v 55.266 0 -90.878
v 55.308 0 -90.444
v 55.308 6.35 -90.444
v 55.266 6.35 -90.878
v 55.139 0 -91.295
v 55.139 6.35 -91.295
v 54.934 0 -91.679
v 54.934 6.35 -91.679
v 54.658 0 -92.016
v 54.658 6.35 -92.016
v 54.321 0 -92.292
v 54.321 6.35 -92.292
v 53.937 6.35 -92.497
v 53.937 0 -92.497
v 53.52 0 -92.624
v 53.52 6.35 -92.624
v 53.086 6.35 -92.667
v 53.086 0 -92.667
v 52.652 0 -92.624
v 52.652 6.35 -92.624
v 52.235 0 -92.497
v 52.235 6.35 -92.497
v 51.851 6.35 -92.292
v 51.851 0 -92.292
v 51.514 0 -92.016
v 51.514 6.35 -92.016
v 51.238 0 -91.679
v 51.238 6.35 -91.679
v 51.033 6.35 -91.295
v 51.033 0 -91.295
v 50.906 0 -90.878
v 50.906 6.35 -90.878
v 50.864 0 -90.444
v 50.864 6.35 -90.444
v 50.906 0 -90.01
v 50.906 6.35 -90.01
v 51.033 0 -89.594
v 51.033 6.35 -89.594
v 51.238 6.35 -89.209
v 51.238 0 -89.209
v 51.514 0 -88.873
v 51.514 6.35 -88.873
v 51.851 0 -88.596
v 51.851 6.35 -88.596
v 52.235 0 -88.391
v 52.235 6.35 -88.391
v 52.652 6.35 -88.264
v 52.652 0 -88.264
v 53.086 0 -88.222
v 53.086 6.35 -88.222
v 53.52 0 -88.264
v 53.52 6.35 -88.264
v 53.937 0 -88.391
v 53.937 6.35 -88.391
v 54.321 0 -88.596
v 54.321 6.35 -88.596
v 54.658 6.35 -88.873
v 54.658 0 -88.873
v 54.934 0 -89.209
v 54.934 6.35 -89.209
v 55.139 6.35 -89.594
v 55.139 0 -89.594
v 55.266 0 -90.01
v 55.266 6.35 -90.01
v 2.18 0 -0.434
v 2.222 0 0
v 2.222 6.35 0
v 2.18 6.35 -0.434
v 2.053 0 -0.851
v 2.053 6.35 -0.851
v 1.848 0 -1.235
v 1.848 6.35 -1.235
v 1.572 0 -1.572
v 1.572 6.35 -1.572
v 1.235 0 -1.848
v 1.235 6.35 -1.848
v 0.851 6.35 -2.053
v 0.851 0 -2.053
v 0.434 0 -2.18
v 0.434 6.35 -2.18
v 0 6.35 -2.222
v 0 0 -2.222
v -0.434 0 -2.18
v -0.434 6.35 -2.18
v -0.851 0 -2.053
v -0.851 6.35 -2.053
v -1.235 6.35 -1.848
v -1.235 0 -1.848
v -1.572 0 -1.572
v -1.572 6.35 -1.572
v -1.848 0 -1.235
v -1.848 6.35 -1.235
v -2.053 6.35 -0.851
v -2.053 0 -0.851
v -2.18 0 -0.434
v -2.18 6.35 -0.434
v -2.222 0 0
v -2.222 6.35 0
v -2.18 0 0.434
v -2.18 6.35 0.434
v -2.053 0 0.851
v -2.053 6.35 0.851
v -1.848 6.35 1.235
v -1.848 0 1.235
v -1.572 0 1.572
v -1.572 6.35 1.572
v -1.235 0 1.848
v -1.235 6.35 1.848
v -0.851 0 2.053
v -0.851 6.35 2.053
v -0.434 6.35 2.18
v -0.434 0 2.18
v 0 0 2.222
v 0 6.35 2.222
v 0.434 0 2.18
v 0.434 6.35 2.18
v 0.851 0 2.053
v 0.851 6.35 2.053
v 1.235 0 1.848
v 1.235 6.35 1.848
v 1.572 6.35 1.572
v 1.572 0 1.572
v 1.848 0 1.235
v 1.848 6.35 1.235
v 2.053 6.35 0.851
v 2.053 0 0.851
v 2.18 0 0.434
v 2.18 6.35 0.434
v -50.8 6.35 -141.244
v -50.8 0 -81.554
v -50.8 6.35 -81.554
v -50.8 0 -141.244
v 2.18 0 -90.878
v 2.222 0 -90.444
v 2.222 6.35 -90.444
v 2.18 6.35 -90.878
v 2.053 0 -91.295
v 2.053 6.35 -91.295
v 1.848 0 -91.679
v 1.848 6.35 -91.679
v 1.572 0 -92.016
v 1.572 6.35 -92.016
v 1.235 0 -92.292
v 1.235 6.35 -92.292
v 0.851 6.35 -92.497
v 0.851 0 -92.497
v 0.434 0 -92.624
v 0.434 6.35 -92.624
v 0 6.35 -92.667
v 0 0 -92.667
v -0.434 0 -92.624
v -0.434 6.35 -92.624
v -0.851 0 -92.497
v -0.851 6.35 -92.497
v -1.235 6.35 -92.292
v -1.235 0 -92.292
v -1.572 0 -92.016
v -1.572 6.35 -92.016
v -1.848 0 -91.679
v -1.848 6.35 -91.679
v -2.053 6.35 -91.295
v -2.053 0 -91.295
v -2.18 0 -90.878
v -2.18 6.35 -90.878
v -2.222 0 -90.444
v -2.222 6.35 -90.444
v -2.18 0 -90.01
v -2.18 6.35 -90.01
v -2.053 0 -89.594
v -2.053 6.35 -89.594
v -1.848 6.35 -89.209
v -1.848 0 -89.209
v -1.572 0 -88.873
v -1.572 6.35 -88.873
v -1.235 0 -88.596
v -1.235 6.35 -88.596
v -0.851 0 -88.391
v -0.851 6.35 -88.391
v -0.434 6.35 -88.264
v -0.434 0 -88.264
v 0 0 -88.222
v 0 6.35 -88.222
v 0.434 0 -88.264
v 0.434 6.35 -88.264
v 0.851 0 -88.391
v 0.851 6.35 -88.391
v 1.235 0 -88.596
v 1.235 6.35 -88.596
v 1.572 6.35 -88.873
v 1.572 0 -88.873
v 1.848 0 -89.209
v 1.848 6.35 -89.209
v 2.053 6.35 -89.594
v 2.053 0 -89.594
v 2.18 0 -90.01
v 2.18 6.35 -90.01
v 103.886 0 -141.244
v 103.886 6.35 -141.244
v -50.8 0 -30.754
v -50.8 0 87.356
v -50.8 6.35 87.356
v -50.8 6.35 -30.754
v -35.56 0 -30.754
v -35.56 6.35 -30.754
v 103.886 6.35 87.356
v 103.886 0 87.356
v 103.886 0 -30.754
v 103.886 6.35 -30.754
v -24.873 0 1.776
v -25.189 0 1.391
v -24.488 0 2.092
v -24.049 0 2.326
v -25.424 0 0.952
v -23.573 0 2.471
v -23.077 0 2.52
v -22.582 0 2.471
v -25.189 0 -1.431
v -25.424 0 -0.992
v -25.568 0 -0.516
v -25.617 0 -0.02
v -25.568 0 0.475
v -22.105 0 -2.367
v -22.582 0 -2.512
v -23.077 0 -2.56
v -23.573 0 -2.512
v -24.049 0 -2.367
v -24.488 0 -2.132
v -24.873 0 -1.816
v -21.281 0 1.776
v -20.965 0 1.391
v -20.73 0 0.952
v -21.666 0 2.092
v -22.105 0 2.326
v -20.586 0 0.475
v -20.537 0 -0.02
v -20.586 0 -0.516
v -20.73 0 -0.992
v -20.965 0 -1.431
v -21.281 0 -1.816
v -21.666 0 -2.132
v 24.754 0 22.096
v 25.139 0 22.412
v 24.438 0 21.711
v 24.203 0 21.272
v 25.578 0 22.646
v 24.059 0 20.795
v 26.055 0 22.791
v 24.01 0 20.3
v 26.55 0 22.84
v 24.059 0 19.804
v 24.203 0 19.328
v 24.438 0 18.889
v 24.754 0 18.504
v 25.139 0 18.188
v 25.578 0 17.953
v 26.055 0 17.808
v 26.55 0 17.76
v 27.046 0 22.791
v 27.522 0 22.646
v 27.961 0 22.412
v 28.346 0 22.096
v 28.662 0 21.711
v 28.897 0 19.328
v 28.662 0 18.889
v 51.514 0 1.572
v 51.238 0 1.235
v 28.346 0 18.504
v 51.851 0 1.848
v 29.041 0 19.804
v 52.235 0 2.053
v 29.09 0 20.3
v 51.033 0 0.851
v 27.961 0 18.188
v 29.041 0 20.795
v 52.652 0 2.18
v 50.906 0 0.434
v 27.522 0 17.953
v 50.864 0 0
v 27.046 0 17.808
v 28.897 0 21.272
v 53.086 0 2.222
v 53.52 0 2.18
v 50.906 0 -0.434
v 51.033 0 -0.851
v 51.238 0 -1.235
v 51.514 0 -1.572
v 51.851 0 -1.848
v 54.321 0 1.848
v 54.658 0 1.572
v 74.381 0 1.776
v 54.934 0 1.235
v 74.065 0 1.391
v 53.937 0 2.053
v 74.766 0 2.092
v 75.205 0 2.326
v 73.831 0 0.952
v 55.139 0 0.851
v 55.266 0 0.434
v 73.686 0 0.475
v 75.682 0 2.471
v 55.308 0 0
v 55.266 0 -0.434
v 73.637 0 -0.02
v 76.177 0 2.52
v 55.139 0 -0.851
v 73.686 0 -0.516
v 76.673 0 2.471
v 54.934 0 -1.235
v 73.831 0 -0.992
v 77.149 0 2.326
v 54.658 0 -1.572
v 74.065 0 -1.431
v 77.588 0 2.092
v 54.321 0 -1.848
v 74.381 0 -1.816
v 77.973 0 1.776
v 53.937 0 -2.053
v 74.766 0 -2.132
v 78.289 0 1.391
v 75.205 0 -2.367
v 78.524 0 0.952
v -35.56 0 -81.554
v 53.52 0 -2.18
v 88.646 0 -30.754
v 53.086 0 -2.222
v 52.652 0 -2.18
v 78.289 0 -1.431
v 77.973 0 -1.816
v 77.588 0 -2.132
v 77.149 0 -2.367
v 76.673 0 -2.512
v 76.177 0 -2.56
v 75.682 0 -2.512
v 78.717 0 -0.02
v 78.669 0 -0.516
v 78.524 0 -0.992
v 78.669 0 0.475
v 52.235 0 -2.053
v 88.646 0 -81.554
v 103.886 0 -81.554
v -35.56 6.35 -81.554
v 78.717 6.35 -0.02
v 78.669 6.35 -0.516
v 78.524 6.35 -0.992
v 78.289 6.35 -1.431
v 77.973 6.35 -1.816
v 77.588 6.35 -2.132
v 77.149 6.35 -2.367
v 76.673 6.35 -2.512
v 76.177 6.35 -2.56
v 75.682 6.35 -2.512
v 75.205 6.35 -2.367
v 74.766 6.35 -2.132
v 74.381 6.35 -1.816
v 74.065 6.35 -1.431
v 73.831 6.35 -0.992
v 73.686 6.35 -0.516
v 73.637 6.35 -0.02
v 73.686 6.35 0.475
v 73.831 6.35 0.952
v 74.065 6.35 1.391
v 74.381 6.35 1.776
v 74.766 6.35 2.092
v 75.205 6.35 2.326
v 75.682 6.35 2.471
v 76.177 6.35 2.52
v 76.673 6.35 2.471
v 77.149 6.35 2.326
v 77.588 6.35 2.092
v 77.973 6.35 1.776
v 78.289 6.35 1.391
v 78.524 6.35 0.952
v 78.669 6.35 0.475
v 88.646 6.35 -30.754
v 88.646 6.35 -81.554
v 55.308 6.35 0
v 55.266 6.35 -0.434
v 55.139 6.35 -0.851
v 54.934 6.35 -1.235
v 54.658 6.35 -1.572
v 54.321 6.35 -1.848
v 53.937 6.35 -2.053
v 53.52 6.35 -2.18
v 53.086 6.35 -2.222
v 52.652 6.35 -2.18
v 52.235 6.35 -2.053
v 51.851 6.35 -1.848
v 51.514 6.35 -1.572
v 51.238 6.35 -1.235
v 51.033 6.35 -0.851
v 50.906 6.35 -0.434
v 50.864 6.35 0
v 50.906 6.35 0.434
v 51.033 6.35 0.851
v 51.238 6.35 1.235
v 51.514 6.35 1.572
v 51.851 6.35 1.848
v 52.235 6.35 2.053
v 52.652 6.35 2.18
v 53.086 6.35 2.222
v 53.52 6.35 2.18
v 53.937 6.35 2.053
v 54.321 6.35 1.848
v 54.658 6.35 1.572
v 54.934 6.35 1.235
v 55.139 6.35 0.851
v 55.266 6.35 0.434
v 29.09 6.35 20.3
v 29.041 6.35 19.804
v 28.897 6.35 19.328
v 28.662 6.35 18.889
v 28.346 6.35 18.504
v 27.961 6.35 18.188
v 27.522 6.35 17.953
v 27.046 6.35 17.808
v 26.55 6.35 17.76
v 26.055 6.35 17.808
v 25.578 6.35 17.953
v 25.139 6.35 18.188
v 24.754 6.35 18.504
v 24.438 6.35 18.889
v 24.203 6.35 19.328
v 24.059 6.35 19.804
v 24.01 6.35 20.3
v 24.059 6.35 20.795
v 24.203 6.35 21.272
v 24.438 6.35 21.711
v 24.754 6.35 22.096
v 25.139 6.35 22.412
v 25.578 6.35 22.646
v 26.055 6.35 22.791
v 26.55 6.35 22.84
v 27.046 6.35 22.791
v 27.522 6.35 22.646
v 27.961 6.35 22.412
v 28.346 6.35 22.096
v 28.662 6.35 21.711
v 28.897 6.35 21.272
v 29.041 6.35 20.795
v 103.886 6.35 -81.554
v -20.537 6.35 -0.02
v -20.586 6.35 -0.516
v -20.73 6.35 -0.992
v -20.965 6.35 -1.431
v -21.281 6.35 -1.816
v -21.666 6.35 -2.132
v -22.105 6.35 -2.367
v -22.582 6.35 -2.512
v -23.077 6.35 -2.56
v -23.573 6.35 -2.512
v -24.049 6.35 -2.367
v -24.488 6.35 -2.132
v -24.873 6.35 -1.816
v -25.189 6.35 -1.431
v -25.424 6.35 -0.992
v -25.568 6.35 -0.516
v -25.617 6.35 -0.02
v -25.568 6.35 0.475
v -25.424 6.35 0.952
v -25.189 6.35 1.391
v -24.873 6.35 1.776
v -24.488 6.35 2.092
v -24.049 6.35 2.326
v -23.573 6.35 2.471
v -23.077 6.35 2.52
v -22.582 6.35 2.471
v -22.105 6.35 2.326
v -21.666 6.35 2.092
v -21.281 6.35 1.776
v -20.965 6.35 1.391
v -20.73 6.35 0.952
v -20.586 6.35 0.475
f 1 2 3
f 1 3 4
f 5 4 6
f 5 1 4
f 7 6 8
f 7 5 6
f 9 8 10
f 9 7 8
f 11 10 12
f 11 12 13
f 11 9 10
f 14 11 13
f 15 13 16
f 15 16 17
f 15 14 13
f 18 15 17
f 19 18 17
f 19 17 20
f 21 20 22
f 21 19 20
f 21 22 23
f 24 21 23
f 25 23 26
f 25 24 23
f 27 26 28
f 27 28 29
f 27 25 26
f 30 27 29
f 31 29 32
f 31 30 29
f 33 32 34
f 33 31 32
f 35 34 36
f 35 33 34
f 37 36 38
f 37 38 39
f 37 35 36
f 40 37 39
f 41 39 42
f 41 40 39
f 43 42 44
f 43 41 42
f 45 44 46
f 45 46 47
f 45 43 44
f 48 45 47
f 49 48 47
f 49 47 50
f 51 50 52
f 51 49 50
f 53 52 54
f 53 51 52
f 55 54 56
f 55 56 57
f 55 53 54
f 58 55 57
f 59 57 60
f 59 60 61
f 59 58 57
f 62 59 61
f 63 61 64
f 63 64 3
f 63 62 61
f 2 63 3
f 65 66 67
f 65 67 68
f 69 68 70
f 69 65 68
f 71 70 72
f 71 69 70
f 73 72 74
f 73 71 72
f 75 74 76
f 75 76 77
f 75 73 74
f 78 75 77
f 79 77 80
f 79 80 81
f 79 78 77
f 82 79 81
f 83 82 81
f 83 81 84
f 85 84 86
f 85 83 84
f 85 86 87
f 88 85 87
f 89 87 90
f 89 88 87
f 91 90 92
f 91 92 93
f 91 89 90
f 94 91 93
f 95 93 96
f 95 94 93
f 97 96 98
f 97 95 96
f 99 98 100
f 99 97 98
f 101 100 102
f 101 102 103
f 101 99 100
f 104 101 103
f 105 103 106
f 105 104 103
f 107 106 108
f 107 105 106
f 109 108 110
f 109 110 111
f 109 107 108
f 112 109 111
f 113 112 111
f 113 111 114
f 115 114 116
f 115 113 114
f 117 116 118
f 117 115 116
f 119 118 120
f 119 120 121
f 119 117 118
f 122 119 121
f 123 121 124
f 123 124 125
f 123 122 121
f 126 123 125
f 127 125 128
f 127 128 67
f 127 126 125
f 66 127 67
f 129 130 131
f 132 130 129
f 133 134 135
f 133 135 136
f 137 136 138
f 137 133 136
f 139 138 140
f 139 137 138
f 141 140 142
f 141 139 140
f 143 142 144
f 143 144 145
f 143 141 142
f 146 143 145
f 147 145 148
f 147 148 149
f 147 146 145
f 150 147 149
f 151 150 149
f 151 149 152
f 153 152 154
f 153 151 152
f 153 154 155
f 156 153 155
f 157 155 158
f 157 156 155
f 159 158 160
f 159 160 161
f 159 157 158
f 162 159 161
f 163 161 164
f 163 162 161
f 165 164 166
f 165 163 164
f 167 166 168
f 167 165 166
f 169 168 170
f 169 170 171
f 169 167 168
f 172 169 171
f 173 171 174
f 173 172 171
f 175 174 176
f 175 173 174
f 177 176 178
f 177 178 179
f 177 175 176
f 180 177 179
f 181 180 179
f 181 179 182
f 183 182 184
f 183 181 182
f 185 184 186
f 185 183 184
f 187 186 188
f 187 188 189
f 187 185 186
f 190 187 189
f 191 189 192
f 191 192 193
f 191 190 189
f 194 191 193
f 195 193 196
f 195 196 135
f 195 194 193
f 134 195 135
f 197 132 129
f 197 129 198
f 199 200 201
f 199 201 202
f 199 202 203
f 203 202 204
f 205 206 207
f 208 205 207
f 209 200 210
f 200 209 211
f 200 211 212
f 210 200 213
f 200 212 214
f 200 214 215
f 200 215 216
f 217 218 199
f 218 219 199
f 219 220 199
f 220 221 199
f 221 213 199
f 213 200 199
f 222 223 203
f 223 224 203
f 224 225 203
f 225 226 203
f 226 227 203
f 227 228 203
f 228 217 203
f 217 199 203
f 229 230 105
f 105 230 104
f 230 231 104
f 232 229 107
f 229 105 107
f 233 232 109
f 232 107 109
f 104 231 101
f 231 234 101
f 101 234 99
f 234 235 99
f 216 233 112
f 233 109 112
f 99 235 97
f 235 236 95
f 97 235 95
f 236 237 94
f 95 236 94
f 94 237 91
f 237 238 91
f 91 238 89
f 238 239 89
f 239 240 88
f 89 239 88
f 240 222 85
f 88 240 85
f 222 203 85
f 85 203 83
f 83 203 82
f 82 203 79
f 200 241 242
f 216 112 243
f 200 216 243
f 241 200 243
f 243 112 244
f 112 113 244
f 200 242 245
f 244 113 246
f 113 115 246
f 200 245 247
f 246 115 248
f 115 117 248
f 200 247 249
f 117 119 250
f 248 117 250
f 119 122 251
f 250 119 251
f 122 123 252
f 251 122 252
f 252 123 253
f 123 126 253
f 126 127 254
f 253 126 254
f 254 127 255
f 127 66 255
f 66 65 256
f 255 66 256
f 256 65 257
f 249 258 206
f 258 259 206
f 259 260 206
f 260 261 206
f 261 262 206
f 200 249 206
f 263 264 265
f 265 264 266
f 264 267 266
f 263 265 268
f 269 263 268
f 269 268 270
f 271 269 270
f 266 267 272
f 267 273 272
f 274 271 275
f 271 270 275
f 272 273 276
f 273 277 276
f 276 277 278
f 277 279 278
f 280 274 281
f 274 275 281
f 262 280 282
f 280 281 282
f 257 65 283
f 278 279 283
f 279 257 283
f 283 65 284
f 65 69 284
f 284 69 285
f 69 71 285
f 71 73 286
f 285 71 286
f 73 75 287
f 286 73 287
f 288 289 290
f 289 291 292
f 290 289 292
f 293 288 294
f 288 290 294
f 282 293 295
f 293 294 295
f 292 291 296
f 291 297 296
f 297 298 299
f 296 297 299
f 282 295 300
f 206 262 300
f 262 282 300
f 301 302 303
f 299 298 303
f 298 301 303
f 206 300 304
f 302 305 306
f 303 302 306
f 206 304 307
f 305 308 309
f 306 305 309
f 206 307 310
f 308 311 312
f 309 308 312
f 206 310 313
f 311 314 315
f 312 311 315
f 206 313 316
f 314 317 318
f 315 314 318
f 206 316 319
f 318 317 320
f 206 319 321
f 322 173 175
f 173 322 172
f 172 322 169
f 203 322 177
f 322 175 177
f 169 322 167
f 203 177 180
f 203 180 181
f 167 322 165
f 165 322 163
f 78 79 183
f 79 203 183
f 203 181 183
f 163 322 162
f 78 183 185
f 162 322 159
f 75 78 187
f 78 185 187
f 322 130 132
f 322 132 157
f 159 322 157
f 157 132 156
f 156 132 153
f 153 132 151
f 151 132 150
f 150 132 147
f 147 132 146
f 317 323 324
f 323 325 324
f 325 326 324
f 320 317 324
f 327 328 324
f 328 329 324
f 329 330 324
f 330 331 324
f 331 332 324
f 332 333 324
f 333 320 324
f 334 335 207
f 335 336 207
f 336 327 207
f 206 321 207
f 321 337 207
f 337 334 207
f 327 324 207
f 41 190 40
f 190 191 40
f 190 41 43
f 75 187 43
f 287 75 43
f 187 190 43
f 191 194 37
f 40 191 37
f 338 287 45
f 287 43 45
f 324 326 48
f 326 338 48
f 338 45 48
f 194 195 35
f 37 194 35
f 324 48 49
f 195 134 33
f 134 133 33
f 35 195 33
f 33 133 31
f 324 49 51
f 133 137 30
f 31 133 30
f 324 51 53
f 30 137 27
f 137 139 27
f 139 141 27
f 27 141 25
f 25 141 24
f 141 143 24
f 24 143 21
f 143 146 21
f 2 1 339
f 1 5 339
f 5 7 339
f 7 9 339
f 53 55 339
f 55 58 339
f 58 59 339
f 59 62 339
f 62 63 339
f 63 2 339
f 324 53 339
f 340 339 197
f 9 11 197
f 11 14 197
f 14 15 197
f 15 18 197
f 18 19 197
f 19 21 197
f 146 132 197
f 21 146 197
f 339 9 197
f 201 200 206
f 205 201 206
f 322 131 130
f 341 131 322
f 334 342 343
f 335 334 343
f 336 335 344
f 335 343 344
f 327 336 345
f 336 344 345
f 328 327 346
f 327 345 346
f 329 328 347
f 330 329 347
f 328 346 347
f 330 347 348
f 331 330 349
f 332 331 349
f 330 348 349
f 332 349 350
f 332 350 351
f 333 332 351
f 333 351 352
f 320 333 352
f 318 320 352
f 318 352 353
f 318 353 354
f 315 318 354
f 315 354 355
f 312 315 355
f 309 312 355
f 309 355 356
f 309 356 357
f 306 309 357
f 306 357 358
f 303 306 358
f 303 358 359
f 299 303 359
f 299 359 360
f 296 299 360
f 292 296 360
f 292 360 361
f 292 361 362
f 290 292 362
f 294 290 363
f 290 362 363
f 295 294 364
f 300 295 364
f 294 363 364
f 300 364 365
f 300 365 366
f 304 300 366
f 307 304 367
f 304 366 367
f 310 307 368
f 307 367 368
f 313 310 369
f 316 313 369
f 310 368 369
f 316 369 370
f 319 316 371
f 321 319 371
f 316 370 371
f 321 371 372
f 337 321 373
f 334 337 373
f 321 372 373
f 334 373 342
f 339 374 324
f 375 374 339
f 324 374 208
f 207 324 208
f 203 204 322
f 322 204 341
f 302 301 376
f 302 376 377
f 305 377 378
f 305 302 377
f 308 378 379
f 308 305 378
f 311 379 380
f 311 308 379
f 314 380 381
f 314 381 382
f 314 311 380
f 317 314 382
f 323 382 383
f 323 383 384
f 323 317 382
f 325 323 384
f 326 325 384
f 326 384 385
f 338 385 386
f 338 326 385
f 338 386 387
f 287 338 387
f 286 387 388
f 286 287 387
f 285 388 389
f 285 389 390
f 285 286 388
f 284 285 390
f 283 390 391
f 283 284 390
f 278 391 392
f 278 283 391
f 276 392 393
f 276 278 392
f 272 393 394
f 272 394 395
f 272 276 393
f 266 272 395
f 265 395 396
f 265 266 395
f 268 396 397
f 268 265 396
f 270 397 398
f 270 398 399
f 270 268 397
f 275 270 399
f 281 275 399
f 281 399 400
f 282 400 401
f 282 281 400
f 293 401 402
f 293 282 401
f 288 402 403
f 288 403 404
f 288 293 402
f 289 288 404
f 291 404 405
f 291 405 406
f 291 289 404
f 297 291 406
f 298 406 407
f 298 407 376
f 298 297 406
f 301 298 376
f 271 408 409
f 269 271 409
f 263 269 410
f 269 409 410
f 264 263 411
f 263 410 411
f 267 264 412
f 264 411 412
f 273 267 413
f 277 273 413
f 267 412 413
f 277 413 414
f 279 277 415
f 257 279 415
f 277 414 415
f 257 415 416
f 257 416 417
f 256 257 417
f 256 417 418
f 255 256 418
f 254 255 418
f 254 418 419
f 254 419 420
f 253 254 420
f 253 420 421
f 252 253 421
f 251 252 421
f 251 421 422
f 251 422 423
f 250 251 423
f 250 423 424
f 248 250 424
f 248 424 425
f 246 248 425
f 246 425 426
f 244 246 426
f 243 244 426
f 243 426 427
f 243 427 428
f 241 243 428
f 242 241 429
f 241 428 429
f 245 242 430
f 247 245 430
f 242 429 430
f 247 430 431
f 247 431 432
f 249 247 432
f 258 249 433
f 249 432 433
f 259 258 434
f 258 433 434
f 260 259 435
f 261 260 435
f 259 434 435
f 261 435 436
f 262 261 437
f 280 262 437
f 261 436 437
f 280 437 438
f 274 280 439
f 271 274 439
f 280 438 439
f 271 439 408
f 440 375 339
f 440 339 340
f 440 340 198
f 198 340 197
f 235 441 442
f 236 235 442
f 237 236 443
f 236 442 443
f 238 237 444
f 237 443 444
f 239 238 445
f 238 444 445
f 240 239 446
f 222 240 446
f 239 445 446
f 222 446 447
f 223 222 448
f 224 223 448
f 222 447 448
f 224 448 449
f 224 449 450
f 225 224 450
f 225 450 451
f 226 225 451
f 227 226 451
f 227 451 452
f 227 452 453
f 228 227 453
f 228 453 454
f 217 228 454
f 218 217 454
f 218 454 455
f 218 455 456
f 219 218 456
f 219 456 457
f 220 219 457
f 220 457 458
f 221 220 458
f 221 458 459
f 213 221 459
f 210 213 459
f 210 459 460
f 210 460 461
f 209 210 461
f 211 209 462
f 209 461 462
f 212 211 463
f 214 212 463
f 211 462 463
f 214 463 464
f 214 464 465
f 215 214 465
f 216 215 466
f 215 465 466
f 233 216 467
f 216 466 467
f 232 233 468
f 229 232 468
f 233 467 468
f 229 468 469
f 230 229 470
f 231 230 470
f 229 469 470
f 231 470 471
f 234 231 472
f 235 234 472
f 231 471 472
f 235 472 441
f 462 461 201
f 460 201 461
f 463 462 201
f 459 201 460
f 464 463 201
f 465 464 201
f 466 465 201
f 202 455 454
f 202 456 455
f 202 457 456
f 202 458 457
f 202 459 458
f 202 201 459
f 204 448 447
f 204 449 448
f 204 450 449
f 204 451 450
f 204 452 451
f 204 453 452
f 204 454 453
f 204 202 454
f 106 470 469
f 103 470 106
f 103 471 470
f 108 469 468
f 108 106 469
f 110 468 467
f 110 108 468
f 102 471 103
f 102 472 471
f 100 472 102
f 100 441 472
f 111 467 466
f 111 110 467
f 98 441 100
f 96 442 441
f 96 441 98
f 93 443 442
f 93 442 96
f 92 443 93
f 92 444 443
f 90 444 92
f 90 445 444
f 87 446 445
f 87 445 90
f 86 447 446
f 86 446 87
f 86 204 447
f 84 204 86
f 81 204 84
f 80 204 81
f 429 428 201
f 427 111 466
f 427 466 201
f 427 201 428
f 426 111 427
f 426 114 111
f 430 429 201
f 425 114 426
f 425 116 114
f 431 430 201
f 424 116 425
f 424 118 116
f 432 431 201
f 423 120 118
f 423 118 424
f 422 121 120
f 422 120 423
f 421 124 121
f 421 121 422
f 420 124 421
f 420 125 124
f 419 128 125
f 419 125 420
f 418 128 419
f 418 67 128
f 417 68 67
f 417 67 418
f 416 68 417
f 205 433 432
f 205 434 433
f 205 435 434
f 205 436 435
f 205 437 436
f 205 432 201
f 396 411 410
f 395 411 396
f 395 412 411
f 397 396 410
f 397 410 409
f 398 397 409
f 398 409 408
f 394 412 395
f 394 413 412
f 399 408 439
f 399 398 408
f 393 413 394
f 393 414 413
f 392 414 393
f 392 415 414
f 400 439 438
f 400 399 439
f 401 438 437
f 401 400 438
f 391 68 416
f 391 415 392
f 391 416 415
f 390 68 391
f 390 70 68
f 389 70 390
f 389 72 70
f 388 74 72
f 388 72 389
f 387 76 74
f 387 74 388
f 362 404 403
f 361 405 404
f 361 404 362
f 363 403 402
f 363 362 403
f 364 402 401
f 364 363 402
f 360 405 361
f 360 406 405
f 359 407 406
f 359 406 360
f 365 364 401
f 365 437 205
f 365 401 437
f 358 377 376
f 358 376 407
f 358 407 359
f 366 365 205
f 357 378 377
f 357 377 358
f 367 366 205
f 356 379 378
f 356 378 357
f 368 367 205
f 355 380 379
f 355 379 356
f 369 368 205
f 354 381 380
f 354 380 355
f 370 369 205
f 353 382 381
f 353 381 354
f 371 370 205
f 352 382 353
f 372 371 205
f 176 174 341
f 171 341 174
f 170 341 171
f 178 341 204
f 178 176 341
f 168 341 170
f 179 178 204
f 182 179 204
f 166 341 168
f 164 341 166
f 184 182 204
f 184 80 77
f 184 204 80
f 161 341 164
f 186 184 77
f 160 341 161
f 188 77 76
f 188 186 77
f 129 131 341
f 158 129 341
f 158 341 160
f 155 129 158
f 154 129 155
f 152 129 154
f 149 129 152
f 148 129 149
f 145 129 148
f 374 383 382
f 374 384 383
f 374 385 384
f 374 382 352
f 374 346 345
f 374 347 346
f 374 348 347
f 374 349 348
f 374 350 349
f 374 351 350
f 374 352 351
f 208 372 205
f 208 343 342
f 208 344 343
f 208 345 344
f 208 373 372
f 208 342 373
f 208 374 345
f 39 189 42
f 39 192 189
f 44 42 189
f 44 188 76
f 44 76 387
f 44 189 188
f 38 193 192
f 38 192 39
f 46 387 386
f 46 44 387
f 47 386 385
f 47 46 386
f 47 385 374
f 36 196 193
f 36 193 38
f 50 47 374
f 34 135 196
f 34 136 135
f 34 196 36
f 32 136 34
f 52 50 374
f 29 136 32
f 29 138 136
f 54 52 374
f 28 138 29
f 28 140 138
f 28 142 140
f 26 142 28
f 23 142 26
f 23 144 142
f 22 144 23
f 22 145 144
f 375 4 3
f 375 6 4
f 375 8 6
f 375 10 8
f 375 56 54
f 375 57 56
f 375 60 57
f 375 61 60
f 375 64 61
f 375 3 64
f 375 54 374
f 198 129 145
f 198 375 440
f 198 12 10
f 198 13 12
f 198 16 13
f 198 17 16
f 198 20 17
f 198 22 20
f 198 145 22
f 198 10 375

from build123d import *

# Parameters (mm, degrees)
SKETCH2_W           = 154.686
SKETCH2_H           = 228.6
BOSS_EXTRUDE1_DEPTH = 6.35
SKETCH1_R           = 2.2225
CUT_EXTRUDE1_DEPTH  = 6.35
SKETCH3_W           = 15.24
SKETCH3_H           = 50.8
CUT_EXTRUDE2_DEPTH  = 6.35
SKETCH8_R           = 2.54
CUT_EXTRUDE3_DEPTH  = 17.78


with BuildPart() as part:
    # Sketch2 → Boss-Extrude1 (new body)
    with BuildSketch(Plane(origin=(0, 0, 0), x_dir=(1, 0, 0), z_dir=(0, 1, 0))):
        with Locations((26.543, 26.944051327)):
            Rectangle(SKETCH2_W, SKETCH2_H)
    extrude(amount=BOSS_EXTRUDE1_DEPTH)

    # Sketch1 → Cut-Extrude1 (cut)
    with BuildSketch(Plane(origin=(0, 0, 0), x_dir=(1, 0, 0), z_dir=(0, 1, 0))):
        with Locations((0, 90.444051327)):
            Circle(SKETCH1_R)
        with Locations((53.086, 90.444051327)):
            Circle(SKETCH1_R)
        Circle(SKETCH1_R)
        with Locations((53.086, 0)):
            Circle(SKETCH1_R)
    extrude(amount=CUT_EXTRUDE1_DEPTH, mode=Mode.SUBTRACT)

    # Sketch3 → Cut-Extrude2 (cut)
    with BuildSketch(Plane(origin=(0, 6.35, 0), x_dir=(1, 0, 0), z_dir=(0, 1, 0))):
        with Locations((96.266, 56.154051327)):
            Rectangle(SKETCH3_W, SKETCH3_H)
        with Locations((-43.18, 56.154051327)):
            Rectangle(SKETCH3_W, SKETCH3_H)
    extrude(amount=-CUT_EXTRUDE2_DEPTH, mode=Mode.SUBTRACT)

    # Sketch8 → Cut-Extrude3 (cut)
    with BuildSketch(Plane(origin=(0, 6.35, 0), x_dir=(1, 0, 0), z_dir=(0, 1, 0))):
        with Locations((26.550112, -20.29968)):
            Circle(SKETCH8_R)
        with Locations((-23.077082804, 0.02032)):
            Circle(SKETCH8_R)
        with Locations((76.177306804, 0.02032)):
            Circle(SKETCH8_R)
    extrude(amount=-CUT_EXTRUDE3_DEPTH, mode=Mode.SUBTRACT)


solid = part.part
